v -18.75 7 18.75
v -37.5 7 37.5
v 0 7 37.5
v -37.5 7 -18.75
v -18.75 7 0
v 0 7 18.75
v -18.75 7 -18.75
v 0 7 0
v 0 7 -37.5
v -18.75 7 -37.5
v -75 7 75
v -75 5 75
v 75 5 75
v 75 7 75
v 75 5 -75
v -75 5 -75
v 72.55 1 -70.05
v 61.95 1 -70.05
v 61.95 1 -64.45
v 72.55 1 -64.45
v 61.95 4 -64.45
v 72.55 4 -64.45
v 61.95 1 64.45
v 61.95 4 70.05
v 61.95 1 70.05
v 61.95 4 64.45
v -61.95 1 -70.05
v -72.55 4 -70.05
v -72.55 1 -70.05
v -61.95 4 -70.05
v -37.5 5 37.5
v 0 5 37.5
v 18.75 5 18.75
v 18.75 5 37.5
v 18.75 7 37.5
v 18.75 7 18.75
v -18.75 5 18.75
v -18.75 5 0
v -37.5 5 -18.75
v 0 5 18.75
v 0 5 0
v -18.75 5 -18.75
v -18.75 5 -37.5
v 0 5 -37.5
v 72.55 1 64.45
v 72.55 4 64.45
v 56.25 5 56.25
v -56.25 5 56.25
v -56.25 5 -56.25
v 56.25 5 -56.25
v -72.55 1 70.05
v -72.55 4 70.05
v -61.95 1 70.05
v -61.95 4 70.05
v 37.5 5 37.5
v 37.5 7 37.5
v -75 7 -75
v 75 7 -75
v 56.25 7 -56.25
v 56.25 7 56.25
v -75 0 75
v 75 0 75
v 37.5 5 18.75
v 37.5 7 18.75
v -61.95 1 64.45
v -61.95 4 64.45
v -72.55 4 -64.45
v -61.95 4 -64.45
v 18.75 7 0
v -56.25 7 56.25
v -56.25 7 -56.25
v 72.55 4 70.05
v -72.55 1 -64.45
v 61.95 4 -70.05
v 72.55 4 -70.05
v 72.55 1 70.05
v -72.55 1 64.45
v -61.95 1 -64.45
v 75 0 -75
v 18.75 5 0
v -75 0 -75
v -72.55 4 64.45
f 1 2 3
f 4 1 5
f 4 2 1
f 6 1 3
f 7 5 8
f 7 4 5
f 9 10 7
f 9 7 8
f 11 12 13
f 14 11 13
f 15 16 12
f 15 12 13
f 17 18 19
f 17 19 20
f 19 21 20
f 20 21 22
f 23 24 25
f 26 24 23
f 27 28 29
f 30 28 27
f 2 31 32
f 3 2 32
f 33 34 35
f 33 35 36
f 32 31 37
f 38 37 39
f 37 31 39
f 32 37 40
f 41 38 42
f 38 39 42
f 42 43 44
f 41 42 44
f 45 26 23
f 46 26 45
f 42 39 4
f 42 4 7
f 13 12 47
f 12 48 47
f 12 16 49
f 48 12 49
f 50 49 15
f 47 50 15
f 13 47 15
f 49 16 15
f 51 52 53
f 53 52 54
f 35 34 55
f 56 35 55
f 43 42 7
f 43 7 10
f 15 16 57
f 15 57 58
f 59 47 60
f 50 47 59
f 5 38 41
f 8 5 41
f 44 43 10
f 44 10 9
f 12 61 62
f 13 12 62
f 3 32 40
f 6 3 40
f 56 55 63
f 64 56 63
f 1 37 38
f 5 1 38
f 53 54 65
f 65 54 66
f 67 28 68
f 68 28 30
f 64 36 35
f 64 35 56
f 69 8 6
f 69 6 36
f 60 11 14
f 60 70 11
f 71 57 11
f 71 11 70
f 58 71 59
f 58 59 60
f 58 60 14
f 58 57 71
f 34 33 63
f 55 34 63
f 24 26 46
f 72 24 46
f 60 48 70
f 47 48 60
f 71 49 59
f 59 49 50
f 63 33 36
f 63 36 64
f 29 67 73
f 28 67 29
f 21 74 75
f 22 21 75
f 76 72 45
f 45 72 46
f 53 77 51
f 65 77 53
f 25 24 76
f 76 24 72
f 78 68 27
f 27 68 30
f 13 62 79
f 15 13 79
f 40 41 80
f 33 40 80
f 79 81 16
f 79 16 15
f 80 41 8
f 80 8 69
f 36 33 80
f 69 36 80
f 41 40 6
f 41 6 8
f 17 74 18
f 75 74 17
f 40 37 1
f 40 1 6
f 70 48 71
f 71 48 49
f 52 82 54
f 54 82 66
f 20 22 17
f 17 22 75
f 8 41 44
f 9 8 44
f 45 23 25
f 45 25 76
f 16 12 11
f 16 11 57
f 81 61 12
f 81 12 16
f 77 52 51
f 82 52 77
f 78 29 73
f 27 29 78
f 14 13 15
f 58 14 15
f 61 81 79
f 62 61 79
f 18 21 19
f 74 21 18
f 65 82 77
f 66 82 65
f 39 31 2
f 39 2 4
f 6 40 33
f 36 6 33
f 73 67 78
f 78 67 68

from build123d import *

# Parameters (mm, degrees)
SKETCH_1_W          = 150
SKETCH_1_H          = 150
EXTRUDE_1_DEPTH     = 5
SKETCH_10_W         = 150
SKETCH_10_H         = 150
SKETCH_10_W_2       = 112.5
SKETCH_10_H_2       = 112.5
SKETCH_10_W_3       = 18.75
SKETCH_10_H_3       = 18.75
EXTRUDE_8_DEPTH     = 2
SKETCH_6_W          = 10.6
SKETCH_6_H          = 5.6
CUT_EXTRUDE_1_DEPTH = 4
SKETCH_7_W          = 10.6
SKETCH_7_H          = 5.6
EXTRUDE_7_DEPTH     = 1


with BuildPart() as part:
    # Эскиз1 → Бобышка-Вытянуть1 (new body)
    with BuildSketch(Plane(origin=(0, 0, 0), x_dir=(1, 0, 0), z_dir=(0, 1, 0))):
        Rectangle(SKETCH_1_W, SKETCH_1_H)
    extrude(amount=EXTRUDE_1_DEPTH)

    # Эскиз6 → Вырез-Вытянуть1 (cut)
    with BuildSketch(Plane(origin=(0, 5, 0), x_dir=(1, 0, 0), z_dir=(0, 1, 0))):
        with Locations((67.25, -67.25)):
            Rectangle(SKETCH_6_W, SKETCH_6_H)
        with Locations((-67.25, -67.25)):
            Rectangle(SKETCH_6_W, SKETCH_6_H)
        with Locations((-67.25, 67.25)):
            Rectangle(SKETCH_6_W, SKETCH_6_H)
        with Locations((67.25, 67.25)):
            Rectangle(SKETCH_6_W, SKETCH_6_H)
    extrude(amount=-CUT_EXTRUDE_1_DEPTH, mode=Mode.SUBTRACT)

    # Эскиз7 → Бобышка-Вытянуть7 (add)
    with BuildSketch(Plane(origin=(0, 5, 0), x_dir=(1, 0, 0), z_dir=(0, 1, 0))):
        with Locations((67.25, -67.25)):
            Rectangle(SKETCH_7_W, SKETCH_7_H)
        with Locations((-67.25, -67.25)):
            Rectangle(SKETCH_7_W, SKETCH_7_H)
        with Locations((67.25, 67.25)):
            Rectangle(SKETCH_7_W, SKETCH_7_H)
        with Locations((-67.25, 67.25)):
            Rectangle(SKETCH_7_W, SKETCH_7_H)
    extrude(amount=-EXTRUDE_7_DEPTH)


with BuildPart() as body_2:
    # Эскиз10 → Бобышка-Вытянуть8 (new body)
    # profile 1 of 9: a face of its own
    with BuildSketch(Plane(origin=(0, 5, 0), x_dir=(1, 0, 0), z_dir=(0, 1, 0))):
        Rectangle(SKETCH_10_W, SKETCH_10_H)
        Rectangle(SKETCH_10_W_2, SKETCH_10_H_2, mode=Mode.SUBTRACT)
    # profile 2 of 9: a face of its own
    with BuildSketch(Plane(origin=(0, 5, 0), x_dir=(1, 0, 0), z_dir=(0, 1, 0))):
        with Locations((28.125, -28.125)):
            Rectangle(SKETCH_10_W_3, SKETCH_10_H_3)
    # profile 3 of 9: a face of its own
    with BuildSketch(Plane(origin=(0, 5, 0), x_dir=(1, 0, 0), z_dir=(0, 1, 0))):
        with Locations((9.375, -9.375)):
            Rectangle(SKETCH_10_W_3, SKETCH_10_H_3)
    # profile 4 of 9: a face of its own
    with BuildSketch(Plane(origin=(0, 5, 0), x_dir=(1, 0, 0), z_dir=(0, 1, 0))):
        with Locations((-9.375, -28.125)):
            Rectangle(SKETCH_10_W_3, SKETCH_10_H_3)
    # profile 5 of 9: a face of its own
    with BuildSketch(Plane(origin=(0, 5, 0), x_dir=(1, 0, 0), z_dir=(0, 1, 0))):
        with Locations((-28.125, -28.125)):
            Rectangle(SKETCH_10_W_3, SKETCH_10_H_3)
    # profile 6 of 9: a face of its own
    with BuildSketch(Plane(origin=(0, 5, 0), x_dir=(1, 0, 0), z_dir=(0, 1, 0))):
        with Locations((-28.125, -9.375)):
            Rectangle(SKETCH_10_W_3, SKETCH_10_H_3)
    # profile 7 of 9: a face of its own
    with BuildSketch(Plane(origin=(0, 5, 0), x_dir=(1, 0, 0), z_dir=(0, 1, 0))):
        with Locations((-28.125, 9.375)):
            Rectangle(SKETCH_10_W_3, SKETCH_10_H_3)
    # profile 8 of 9: a face of its own
    with BuildSketch(Plane(origin=(0, 5, 0), x_dir=(1, 0, 0), z_dir=(0, 1, 0))):
        with Locations((-9.375, 9.375)):
            Rectangle(SKETCH_10_W_3, SKETCH_10_H_3)
    # profile 9 of 9: a face of its own
    with BuildSketch(Plane(origin=(0, 5, 0), x_dir=(1, 0, 0), z_dir=(0, 1, 0))):
        with Locations((-9.375, 28.125)):
            Rectangle(SKETCH_10_W_3, SKETCH_10_H_3)
    extrude(amount=EXTRUDE_8_DEPTH)


solid = Compound([part.part, body_2.part])
